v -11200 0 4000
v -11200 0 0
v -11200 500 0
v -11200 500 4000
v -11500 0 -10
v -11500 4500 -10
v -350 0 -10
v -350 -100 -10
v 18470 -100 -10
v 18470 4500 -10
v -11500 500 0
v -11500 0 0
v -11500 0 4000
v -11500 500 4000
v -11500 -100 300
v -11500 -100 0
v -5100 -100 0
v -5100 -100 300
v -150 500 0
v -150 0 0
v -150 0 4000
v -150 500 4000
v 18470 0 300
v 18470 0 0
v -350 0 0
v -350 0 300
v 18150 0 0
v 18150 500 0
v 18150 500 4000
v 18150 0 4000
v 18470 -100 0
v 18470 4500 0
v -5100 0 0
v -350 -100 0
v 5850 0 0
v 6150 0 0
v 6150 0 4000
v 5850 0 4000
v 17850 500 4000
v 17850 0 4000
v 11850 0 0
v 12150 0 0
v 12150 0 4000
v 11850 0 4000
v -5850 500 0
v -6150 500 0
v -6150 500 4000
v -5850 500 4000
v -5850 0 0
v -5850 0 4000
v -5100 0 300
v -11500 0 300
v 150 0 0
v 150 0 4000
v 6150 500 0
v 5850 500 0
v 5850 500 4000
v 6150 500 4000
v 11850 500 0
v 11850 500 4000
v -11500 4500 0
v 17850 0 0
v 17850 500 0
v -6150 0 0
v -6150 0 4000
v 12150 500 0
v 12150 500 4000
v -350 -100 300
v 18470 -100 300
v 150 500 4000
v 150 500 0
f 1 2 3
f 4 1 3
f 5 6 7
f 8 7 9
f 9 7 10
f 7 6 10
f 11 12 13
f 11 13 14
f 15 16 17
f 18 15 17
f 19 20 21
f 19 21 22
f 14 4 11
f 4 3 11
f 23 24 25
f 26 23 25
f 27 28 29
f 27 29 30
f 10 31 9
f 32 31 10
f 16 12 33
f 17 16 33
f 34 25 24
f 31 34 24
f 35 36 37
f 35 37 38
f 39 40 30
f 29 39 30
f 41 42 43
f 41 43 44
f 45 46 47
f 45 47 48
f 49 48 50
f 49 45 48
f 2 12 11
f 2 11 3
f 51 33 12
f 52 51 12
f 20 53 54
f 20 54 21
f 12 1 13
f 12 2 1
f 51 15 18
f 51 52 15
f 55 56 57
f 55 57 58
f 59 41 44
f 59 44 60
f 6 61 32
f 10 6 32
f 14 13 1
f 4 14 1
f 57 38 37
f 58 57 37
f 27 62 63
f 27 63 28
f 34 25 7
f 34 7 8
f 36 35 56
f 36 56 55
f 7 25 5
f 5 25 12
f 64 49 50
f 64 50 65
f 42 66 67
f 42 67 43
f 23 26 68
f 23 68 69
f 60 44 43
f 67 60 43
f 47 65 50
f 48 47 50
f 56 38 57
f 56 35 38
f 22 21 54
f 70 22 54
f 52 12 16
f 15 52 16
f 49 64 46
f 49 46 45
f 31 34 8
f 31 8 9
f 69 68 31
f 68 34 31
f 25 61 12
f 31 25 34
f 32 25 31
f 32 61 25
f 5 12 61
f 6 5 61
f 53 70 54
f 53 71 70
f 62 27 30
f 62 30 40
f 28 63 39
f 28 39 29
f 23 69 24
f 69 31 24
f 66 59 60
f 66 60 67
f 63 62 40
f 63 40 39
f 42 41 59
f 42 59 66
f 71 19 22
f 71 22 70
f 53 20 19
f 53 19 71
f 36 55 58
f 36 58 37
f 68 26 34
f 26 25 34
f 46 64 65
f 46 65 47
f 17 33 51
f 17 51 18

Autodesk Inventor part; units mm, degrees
ref_plane "YZ Plane" through (0, 0, 0) normal (1, 0, 0) x (0, 1, 0)
ref_plane "XZ Plane" through (0, 0, 0) normal (0, 1, 0) x (-1, 0, 0)
ref_plane "XY Plane" through (0, 0, 0) normal (0, 0, 1) x (1, 0, 0)
sketch "Sketch1" plane through (0, 0, 0) normal (0, 0, 1) x (1, 0, 0)
  line L0 (-11500, 4500) -> (15700, 4500)
  line L1 (15700, 4500) -> (15700, 0) construction
  line L2 (15700, 0) -> (-11500, 0)
  line L3 (-11500, 0) -> (-11500, 4500)
  line L4 (18150, 0) -> (17850, 0)
  line L5 (17850, 0) -> (17850, 500)
  line L6 (17850, 500) -> (18150, 500)
  line L7 (18150, 500) -> (18150, 0)
  line L8 (15700, 0) -> (18470, 0)
  line L9 (18470, 0) -> (18470, 4500)
  line L10 (18470, 4500) -> (15700, 4500)
  line L11 (-11500, 0) -> (-11500, -100)
  line L12 (-11500, -100) -> (18470, -100)
  line L13 (18470, -100) -> (18470, 0)
  line L14 (-5100, 0) -> (-5100, -100)
  line L15 (-350, 0) -> (-350, -100)
  line L16 (11850, 0) -> (11850, 500)
  line L17 (12150, 0) -> (11850, 0)
  line L18 (11850, 500) -> (12150, 500)
  line L19 (12150, 500) -> (12150, 0)
  line L20 (5850, 0) -> (5850, 500)
  line L21 (6150, 0) -> (5850, 0)
  line L22 (5850, 500) -> (6150, 500)
  line L23 (6150, 500) -> (6150, 0)
  line L24 (-150, 0) -> (-150, 500)
  line L25 (150, 0) -> (-150, 0)
  line L26 (-150, 500) -> (150, 500)
  line L27 (150, 500) -> (150, 0)
  line L28 (-6150, 0) -> (-6150, 500)
  line L29 (-5850, 0) -> (-6150, 0)
  line L30 (-6150, 500) -> (-5850, 500)
  line L31 (-5850, 500) -> (-5850, 0)
  line L32 (-11500, 0) -> (-11200, 0)
  line L33 (-11200, 0) -> (-11200, 500)
  line L34 (-11200, 500) -> (-11500, 500)
  line L35 (-11500, 500) -> (-11500, 0)
  point P0 (0, 0)
  dimension "d0" = 4500
  dimension "d1" = 27200
  dimension "d2" = 300
  dimension "d3" = 500
  dimension "d4" = 11500
  dimension "d5" = 17850
  dimension "d6" = 2770
  dimension "d7" = 100
  dimension "d8" = 4750
  dimension "d9" = 6400
  dimension "d16" = 6000
  dimension "d21" = 5350
extrude "Extrusion1" add sketch "Sketch1" against normal blind 10 contours L0 L10 L9 L8 L7 L6 L5 L2 L19 L18 L16 L23 L22 L20 L27 L26 L24 L31 L30 L28 L33 L34 L3 | L34 L33 L2 L3 | L13 L12 L15 L2 L8 L4 | L4 L5 L6 L7 | L28 L30 L31 L2 | L2 L16 L18 L19 | L24 L26 L27 L2 | L2 L20 L22 L23
extrude "Extrusion2" add sketch "Sketch1" along normal blind 4000 separate body contours L34 L33 L2 L3 | L4 L5 L6 L7 | L28 L30 L31 L2 | L2 L16 L18 L19 | L24 L26 L27 L2 | L2 L20 L22 L23
extrude "Extrusion3" add sketch "Sketch1" along normal blind 300 separate body contours L2 L14 L12 L11 | L13 L12 L15 L2 L8 L4
properties part number "NDM-VOS dummy FLOOR"
